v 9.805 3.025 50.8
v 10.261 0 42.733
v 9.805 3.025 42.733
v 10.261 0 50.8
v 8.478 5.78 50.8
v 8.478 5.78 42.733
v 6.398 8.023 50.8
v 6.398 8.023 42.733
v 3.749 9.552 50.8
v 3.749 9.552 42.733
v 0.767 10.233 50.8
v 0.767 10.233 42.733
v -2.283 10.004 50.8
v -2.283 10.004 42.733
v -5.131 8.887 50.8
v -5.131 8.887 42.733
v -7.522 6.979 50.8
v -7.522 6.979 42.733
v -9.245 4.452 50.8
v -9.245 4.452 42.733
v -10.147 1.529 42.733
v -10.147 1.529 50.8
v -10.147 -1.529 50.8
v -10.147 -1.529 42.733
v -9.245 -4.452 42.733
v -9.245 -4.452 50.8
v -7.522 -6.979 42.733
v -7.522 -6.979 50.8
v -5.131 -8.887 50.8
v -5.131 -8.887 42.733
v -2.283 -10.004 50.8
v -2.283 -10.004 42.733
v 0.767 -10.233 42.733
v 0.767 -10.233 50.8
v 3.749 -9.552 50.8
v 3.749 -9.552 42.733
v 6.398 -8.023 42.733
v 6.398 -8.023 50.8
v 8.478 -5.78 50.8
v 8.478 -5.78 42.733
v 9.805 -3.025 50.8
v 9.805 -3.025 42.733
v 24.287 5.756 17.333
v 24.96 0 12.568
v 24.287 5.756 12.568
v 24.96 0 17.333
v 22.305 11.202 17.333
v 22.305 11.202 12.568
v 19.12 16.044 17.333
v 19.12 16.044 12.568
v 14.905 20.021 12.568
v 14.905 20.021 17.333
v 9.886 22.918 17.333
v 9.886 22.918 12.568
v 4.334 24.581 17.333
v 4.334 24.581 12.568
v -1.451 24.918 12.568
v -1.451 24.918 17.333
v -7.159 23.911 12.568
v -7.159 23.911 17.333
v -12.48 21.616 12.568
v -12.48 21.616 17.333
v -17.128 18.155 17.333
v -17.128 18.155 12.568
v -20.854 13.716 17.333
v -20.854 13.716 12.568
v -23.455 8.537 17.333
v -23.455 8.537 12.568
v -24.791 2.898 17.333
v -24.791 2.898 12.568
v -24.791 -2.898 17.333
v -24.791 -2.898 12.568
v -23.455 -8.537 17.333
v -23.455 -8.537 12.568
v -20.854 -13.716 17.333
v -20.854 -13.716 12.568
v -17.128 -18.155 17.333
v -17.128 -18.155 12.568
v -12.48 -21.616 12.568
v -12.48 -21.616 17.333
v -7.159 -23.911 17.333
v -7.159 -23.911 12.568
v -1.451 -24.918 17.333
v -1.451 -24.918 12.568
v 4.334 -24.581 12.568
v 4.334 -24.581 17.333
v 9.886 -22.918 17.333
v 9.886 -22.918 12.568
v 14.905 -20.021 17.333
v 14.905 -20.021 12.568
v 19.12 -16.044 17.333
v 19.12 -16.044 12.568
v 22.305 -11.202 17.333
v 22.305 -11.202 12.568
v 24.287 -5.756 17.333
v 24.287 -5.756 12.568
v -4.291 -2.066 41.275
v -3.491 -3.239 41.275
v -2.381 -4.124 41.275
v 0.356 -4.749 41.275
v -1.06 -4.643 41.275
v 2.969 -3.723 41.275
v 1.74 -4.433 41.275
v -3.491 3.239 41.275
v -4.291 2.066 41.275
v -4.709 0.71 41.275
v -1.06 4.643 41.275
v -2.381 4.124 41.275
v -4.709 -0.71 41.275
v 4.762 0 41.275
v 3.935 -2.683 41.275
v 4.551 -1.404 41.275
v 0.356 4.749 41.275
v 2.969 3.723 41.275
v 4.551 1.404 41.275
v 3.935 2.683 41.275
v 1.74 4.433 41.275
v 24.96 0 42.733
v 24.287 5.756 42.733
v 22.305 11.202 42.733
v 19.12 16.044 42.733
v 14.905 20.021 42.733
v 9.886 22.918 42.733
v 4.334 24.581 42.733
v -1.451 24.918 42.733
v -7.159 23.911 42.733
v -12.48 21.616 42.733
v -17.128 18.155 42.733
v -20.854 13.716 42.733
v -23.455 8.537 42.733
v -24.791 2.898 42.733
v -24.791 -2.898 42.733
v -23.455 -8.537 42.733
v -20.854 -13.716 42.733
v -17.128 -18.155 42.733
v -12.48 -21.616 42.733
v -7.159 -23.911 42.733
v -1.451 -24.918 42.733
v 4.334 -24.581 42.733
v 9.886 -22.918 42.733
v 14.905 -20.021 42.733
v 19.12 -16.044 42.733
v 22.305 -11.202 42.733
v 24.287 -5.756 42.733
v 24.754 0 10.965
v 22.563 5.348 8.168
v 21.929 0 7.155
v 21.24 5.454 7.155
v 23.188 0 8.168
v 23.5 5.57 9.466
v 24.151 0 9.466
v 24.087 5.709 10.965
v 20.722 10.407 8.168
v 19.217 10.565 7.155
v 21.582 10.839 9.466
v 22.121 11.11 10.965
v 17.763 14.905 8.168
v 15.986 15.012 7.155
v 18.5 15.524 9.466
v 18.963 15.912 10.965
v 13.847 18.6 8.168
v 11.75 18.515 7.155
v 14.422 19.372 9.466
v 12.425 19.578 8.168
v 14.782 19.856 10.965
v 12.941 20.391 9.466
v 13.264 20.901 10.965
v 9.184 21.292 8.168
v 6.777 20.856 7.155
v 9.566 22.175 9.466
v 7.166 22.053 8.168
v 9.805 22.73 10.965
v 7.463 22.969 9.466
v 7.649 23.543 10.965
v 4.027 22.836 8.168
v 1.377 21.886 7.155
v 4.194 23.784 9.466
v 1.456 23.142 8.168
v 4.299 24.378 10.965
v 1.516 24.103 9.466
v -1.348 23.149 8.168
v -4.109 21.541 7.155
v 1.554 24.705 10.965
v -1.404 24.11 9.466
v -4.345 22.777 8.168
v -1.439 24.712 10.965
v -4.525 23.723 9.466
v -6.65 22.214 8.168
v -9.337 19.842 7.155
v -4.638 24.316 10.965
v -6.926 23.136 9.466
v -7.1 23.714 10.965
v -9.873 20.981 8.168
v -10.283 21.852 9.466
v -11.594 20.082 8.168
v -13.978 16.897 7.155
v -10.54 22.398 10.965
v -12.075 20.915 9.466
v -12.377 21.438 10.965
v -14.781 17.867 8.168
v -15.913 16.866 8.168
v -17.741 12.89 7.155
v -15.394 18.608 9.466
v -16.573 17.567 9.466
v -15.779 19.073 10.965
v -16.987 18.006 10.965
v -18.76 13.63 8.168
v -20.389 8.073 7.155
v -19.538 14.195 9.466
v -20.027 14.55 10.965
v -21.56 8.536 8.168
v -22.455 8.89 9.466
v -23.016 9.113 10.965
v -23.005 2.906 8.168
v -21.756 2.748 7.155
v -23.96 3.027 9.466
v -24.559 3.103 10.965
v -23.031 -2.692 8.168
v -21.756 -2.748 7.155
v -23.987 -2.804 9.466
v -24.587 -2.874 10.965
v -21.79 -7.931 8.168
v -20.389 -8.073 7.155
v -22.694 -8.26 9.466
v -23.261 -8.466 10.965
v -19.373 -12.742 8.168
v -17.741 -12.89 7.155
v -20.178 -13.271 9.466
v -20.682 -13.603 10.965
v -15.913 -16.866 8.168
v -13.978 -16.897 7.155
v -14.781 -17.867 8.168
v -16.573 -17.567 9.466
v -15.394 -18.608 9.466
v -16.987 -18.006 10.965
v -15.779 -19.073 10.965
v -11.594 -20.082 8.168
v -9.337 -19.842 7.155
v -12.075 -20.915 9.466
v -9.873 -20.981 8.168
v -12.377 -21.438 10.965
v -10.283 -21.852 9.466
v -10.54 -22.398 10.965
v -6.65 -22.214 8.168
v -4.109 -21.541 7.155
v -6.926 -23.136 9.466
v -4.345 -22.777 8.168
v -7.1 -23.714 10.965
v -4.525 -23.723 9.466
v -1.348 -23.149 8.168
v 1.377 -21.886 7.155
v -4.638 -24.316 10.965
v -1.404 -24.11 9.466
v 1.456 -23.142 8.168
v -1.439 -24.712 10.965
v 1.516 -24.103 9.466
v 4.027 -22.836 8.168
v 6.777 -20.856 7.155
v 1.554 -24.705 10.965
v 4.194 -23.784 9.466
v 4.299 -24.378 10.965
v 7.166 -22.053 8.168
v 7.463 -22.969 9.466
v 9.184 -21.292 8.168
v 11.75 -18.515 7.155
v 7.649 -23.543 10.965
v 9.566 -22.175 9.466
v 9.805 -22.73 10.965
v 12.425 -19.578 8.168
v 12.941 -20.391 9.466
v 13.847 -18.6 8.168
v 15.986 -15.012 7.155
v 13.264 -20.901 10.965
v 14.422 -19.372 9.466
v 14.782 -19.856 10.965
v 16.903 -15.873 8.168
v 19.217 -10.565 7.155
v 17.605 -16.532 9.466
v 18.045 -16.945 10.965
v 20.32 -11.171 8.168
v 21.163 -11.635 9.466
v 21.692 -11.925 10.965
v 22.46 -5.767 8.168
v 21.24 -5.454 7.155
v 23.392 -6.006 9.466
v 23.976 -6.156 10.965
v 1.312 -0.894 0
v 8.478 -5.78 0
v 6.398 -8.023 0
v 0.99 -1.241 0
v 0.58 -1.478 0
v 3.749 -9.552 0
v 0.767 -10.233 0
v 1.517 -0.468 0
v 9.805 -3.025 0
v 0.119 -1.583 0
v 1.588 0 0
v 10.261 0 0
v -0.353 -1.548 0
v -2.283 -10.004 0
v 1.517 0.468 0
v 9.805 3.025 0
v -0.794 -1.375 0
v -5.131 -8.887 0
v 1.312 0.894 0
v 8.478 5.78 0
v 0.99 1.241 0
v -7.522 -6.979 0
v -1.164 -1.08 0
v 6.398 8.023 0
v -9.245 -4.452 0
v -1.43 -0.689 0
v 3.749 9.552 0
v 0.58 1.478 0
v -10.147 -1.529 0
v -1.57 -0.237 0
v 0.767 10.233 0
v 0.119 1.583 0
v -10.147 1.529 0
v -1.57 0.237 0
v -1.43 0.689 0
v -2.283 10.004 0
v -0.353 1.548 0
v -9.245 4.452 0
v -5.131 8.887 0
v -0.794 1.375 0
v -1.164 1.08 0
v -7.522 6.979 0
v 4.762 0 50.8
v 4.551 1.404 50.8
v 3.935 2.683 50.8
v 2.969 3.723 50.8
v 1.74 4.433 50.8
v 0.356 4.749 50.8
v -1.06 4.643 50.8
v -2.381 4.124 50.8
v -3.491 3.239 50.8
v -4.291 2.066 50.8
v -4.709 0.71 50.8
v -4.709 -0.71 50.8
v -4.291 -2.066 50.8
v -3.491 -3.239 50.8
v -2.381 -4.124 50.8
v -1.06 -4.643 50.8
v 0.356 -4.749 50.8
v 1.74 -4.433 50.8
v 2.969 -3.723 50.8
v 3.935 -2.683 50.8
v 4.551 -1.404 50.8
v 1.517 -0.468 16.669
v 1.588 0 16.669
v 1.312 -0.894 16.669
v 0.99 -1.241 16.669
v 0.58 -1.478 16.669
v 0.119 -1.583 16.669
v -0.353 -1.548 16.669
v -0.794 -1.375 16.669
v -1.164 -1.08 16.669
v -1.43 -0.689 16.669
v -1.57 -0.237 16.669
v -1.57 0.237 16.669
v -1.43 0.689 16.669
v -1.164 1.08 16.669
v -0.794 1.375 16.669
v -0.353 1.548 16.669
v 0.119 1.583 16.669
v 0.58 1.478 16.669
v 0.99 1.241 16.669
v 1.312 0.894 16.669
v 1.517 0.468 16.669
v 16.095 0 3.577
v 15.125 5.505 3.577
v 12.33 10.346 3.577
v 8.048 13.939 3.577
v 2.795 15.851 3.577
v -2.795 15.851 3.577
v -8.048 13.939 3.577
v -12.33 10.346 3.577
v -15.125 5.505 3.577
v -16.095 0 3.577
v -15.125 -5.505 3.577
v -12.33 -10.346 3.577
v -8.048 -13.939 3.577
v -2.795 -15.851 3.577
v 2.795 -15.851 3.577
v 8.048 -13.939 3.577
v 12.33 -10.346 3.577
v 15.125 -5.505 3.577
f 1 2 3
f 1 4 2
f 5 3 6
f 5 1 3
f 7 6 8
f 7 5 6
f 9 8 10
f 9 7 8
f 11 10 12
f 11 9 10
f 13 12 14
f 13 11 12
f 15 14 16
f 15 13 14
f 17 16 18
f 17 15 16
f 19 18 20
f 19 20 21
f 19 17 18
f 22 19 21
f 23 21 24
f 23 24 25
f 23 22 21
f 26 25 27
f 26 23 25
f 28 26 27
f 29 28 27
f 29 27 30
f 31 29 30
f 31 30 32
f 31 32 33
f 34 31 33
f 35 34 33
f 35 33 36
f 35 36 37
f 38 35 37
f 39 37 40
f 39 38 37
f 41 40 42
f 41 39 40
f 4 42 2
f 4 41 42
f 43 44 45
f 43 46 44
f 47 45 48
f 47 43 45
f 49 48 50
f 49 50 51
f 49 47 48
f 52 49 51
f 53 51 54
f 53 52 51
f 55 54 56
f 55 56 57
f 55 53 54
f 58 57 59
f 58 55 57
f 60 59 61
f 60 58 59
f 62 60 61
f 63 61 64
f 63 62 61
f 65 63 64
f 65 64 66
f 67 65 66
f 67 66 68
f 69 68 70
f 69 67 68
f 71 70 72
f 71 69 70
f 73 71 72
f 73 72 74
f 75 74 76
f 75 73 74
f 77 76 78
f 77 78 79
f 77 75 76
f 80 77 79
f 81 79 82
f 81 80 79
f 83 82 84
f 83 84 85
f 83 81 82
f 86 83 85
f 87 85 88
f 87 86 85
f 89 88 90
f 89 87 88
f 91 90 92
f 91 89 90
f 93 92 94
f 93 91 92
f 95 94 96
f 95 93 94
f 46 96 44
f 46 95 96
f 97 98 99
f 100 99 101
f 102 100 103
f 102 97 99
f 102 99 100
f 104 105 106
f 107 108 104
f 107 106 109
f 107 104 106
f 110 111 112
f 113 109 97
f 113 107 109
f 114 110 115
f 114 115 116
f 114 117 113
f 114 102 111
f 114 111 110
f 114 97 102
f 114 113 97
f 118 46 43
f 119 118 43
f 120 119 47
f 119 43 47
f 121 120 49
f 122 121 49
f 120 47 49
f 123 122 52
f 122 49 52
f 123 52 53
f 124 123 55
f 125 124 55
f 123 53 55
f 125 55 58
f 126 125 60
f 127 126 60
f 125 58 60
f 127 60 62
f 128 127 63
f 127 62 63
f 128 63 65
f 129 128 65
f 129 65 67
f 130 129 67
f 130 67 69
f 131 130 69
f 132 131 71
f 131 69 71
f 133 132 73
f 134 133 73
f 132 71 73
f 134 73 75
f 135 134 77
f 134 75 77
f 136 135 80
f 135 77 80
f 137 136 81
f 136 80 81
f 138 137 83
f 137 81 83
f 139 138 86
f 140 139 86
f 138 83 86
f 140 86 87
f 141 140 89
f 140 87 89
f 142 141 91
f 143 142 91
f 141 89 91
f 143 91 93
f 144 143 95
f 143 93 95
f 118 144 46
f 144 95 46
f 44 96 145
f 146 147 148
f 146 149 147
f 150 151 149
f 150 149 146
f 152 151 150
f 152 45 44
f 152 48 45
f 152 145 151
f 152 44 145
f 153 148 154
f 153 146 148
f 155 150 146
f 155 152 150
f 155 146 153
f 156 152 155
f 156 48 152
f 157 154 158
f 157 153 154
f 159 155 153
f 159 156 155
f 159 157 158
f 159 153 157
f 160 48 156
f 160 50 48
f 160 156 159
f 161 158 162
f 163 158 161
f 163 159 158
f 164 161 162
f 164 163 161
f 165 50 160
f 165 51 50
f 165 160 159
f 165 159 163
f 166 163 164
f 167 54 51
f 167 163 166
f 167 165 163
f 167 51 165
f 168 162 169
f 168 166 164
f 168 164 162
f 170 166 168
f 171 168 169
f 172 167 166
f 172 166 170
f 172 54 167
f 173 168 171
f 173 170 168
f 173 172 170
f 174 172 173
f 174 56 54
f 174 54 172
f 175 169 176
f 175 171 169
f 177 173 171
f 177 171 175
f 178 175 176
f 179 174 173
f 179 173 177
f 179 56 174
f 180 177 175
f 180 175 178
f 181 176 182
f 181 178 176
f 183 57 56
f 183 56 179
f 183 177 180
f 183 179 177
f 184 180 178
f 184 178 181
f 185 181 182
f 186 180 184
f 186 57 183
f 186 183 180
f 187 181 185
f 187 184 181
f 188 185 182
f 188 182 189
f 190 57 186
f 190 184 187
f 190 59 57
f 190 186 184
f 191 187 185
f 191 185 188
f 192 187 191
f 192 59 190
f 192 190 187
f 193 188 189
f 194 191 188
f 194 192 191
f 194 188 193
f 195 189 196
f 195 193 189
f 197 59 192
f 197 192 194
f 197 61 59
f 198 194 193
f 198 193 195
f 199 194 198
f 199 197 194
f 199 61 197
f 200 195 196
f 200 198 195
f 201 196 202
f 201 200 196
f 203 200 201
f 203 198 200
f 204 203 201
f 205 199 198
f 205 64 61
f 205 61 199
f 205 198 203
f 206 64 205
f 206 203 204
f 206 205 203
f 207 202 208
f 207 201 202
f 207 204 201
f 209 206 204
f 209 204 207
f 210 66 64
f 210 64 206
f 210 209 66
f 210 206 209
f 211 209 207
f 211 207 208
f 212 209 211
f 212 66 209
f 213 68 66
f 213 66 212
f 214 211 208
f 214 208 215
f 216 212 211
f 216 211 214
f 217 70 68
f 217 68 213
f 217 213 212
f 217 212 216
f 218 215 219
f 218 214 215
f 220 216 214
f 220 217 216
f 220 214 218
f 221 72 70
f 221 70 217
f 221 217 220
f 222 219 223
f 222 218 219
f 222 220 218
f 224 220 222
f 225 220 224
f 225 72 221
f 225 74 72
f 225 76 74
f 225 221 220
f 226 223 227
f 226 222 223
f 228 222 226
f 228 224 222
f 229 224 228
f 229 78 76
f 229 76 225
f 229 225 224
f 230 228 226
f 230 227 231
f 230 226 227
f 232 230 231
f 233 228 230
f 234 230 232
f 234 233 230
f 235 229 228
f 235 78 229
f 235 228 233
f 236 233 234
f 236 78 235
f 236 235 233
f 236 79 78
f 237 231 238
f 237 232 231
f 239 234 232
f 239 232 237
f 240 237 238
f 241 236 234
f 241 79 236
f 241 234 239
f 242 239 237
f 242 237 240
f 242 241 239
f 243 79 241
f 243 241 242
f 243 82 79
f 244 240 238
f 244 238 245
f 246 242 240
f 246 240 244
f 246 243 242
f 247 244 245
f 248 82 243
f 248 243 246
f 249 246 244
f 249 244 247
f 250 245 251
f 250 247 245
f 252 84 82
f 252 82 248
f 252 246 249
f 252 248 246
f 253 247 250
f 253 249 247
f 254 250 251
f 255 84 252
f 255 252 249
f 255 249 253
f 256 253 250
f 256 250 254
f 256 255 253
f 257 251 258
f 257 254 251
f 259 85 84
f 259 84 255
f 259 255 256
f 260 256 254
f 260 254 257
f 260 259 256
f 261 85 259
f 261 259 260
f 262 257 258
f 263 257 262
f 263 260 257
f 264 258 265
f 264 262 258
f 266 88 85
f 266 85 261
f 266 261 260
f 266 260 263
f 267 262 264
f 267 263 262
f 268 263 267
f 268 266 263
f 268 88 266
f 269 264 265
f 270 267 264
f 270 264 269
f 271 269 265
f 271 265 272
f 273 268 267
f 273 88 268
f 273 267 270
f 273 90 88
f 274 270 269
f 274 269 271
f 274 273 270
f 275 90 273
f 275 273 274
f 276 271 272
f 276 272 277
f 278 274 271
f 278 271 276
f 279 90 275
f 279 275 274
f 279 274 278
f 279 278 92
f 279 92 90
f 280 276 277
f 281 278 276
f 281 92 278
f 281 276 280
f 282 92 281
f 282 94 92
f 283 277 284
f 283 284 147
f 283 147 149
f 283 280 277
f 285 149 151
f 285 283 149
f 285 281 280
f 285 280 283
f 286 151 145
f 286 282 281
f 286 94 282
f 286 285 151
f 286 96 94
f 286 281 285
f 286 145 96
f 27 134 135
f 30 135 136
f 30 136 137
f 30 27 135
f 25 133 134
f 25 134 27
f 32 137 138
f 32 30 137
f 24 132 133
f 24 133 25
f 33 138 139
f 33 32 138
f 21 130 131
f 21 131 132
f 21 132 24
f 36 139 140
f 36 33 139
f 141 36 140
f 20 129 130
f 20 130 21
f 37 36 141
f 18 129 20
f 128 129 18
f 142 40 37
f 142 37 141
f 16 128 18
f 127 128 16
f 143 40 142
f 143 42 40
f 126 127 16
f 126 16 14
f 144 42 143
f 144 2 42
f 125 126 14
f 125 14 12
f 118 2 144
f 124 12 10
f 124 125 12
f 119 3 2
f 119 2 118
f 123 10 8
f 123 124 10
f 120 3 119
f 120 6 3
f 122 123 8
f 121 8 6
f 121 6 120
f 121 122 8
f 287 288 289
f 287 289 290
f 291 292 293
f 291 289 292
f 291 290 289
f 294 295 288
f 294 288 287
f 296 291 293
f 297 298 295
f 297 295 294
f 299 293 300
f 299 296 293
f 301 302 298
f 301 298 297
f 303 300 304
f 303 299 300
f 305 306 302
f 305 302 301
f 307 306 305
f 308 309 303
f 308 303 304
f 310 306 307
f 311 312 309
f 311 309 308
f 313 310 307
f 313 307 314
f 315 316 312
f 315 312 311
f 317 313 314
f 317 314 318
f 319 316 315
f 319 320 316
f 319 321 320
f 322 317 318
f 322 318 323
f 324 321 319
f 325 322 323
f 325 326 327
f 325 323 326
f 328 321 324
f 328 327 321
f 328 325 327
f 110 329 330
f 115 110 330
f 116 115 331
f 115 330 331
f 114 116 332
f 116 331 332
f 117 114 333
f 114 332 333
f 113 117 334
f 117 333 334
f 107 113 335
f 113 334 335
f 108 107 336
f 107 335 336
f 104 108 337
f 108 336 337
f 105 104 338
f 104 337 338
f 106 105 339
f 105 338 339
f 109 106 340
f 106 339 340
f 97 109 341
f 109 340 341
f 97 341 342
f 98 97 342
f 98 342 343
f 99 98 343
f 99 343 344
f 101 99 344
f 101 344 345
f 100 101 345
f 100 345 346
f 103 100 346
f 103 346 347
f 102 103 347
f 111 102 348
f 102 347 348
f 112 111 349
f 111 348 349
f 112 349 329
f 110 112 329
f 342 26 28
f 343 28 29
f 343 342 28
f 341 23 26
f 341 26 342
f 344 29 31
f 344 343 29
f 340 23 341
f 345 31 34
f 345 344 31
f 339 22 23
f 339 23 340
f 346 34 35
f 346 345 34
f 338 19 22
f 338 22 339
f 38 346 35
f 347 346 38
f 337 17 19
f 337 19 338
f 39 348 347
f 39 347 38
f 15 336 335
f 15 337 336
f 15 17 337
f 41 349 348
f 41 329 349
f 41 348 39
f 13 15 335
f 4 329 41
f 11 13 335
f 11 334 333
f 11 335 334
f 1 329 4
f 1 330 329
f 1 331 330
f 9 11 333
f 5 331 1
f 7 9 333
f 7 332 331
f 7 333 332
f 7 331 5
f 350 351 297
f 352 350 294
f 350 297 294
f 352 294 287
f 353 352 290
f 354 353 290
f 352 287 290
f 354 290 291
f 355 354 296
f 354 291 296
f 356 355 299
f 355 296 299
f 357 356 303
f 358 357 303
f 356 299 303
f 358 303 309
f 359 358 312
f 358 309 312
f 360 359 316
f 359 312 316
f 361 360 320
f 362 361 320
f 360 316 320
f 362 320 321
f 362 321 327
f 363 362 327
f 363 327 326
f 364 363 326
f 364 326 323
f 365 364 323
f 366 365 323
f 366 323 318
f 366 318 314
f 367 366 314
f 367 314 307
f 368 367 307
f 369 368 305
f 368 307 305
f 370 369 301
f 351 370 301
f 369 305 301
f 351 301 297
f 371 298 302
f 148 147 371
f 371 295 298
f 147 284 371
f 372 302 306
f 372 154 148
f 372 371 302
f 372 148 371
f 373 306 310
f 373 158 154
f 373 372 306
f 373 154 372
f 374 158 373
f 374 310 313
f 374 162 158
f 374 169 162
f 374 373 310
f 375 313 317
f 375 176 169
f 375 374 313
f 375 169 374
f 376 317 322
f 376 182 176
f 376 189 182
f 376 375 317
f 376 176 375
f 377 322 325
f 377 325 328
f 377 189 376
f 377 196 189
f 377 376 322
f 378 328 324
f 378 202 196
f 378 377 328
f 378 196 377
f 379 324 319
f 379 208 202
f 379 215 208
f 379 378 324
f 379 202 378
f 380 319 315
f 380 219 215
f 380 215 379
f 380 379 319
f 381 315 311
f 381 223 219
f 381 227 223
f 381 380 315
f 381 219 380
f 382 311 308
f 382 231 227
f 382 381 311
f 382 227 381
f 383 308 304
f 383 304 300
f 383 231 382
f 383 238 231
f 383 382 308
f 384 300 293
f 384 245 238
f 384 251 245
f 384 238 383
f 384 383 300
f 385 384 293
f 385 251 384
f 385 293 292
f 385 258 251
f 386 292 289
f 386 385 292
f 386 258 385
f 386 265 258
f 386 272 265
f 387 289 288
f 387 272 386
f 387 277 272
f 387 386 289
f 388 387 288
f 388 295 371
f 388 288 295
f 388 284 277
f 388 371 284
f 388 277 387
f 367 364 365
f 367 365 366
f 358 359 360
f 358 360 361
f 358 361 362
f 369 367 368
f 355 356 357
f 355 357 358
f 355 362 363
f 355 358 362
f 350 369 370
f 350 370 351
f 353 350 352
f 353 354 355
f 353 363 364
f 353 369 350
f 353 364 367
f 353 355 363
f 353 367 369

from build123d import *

# Parameters (mm, degrees)
F2_R     = 4.7625
F3_DEPTH = 9.525
F4_R     = 1.5875
F5_DEPTH = 16.66875
F6_DEPTH = 25.4


with BuildPart() as f1:
    # F0 (on Front) → F1 (revolve)
    with BuildSketch(Plane.XZ):
        with BuildLine():
            Line((0, 50.8), (0, 0))
            Line((0, 0), (10.2612478659, 0))
            Line((10.2612478659, 0), (21.9292579814, 7.1549119122))
            ThreePointArc((21.9292579814, 7.1549119122), (24.1505997169, 9.4662699385), (24.9597914517, 12.5681957545))
            Line((24.9597914517, 12.5681957545), (24.9597914517, 17.3331890255))
            Line((24.9597914517, 17.3331890255), (10.2612478659, 17.3331890255))
            Line((10.2612478659, 17.3331890255), (10.2612478659, 50.8))
            Line((10.2612478659, 50.8), (0, 50.8))
        make_face()
    revolve(axis=Axis((0, 0, 25.4), (0, 0, 1)))

    # F2 (on face) → F3 (cut)
    with BuildSketch(Plane.XY.offset(50.8)):
        Circle(F2_R)
    extrude(amount=-F3_DEPTH, mode=Mode.SUBTRACT)

    # F4 (on face) → F5 (cut)
    with BuildSketch(Plane(origin=(0, 0, 0), x_dir=(1, 0, 0), z_dir=(0, 0, -1))):
        Circle(F4_R)
    extrude(amount=-F5_DEPTH, mode=Mode.SUBTRACT)

    # F6 (add): a face of the model
    f6_faces = [f1.faces().sort_by_distance(p)[0] for p in [
        (-24.25382194, 0, 17.3331890255),
    ]]
    extrude(f6_faces, amount=F6_DEPTH)


solid = f1.part
